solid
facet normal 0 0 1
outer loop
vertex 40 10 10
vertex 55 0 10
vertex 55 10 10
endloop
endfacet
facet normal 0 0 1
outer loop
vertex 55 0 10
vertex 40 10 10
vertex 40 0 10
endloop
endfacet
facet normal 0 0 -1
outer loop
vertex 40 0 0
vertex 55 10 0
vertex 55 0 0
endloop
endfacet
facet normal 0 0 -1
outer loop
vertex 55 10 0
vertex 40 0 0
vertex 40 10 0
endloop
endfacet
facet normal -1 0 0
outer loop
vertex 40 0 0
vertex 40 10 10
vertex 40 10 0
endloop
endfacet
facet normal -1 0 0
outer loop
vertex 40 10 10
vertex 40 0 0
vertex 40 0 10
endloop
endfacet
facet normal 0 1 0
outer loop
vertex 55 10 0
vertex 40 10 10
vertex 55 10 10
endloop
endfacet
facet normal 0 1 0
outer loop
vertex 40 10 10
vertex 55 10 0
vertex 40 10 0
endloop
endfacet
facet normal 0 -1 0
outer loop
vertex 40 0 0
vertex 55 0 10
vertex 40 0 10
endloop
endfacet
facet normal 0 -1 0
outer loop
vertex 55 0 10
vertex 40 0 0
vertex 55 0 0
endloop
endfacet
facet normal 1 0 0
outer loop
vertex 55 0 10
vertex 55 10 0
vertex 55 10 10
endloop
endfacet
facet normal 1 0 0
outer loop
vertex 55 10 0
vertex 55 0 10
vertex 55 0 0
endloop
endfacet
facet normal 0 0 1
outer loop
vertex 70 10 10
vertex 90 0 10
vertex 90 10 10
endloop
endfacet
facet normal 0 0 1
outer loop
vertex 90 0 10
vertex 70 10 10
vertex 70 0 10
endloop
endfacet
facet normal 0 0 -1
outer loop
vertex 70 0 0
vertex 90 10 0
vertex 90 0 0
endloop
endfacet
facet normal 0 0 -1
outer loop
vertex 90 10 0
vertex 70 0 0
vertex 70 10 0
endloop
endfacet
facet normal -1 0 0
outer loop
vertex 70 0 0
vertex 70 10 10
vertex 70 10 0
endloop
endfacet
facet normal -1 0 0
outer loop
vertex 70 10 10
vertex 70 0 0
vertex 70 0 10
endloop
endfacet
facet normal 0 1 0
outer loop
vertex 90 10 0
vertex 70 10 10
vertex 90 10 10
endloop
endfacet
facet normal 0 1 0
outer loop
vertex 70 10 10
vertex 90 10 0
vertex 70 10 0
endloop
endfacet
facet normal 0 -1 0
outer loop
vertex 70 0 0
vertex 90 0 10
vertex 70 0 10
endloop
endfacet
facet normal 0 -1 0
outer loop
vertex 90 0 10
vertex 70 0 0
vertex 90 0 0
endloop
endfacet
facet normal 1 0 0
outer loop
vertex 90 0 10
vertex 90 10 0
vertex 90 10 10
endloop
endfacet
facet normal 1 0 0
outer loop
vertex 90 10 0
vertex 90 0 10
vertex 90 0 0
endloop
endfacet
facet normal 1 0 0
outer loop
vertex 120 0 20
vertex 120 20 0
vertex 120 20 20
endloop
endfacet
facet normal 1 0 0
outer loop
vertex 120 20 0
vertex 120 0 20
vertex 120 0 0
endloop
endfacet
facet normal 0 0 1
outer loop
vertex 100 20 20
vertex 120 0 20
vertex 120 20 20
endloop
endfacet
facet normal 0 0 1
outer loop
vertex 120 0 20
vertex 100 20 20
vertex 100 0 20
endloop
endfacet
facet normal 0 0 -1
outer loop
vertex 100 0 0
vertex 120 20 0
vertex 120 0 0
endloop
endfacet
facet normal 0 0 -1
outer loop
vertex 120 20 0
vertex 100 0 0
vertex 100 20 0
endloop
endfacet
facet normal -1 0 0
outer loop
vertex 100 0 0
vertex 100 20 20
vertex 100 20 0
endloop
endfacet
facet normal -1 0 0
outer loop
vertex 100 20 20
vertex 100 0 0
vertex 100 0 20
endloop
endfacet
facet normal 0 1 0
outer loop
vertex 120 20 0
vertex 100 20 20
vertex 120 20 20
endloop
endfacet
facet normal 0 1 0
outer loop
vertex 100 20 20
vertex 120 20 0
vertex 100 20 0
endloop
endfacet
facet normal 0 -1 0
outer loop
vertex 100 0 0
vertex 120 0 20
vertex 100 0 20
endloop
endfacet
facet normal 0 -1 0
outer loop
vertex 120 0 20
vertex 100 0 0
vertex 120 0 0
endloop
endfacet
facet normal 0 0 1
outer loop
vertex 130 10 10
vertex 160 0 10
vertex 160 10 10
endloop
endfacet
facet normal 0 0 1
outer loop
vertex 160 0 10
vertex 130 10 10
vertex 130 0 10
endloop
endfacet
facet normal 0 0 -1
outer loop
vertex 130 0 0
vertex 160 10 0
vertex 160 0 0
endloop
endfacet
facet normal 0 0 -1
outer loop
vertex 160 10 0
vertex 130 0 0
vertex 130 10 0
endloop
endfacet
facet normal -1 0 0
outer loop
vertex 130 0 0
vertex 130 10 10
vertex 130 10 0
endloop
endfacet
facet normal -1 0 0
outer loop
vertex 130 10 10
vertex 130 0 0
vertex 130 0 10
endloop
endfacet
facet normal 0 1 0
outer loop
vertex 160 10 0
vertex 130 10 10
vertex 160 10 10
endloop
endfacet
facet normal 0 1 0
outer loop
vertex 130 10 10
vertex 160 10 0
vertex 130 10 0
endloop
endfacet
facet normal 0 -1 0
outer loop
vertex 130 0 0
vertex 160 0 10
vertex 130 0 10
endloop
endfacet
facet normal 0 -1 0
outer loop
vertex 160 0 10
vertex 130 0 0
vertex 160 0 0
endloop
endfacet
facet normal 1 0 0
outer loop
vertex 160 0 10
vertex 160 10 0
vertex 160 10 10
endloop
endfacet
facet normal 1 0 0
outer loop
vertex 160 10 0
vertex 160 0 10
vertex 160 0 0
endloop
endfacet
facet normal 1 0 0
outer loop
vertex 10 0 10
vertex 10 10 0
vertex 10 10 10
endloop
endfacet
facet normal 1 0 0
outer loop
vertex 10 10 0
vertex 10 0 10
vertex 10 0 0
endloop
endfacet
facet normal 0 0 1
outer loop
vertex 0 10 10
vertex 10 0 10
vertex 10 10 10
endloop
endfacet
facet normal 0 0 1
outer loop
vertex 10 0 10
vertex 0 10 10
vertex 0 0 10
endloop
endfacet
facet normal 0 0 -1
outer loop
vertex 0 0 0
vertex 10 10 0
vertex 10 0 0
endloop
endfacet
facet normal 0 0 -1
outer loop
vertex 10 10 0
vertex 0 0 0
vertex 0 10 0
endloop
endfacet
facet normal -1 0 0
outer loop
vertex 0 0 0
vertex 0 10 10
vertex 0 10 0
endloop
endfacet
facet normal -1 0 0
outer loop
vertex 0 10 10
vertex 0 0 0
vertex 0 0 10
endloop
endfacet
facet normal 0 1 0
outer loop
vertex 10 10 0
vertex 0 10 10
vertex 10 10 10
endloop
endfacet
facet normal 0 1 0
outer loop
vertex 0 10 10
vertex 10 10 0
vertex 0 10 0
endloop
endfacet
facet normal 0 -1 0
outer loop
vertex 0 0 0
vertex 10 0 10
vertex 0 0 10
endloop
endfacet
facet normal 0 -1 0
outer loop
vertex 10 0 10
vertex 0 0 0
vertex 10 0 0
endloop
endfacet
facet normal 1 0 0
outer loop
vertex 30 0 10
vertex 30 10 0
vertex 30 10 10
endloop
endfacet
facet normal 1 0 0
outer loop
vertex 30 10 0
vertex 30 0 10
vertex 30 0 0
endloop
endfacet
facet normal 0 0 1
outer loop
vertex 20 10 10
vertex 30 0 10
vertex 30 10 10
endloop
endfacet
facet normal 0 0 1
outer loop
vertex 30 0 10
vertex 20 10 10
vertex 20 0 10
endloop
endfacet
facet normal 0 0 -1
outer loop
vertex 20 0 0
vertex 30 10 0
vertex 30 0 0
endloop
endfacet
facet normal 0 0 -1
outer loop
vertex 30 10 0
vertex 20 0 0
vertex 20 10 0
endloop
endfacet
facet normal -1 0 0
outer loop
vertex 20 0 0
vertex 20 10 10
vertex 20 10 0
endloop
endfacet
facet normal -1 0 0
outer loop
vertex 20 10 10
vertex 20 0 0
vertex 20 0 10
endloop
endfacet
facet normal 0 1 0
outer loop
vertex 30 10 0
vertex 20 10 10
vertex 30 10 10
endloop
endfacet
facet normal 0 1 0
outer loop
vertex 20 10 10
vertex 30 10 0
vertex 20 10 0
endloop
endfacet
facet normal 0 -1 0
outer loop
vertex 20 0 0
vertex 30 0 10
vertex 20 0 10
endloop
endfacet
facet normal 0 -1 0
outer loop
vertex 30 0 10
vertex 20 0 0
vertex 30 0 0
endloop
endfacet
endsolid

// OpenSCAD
// Simple union tests for debugging
// Each test case is clearly separated

// Test 1: Two non-overlapping cubes
translate([0, 0, 0]) cube([10, 10, 10]);
translate([20, 0, 0]) cube([10, 10, 10]);

// Test 2: Two overlapping cubes (should merge)
translate([40, 0, 0]) union() {
    cube([10, 10, 10]);
    translate([5, 0, 0]) cube([10, 10, 10]);
}

// Test 3: Two touching cubes (edge to edge)
translate([70, 0, 0]) union() {
    cube([10, 10, 10]);
    translate([10, 0, 0]) cube([10, 10, 10]);
}

// Test 4: One cube inside another (should result in outer cube only)
translate([100, 0, 0]) union() {
    cube([20, 20, 20]);
    translate([5, 5, 5]) cube([10, 10, 10]);
}

// Test 5: Three cubes in a row
translate([130, 0, 0]) union() {
    cube([10, 10, 10]);
    translate([10, 0, 0]) cube([10, 10, 10]);
    translate([20, 0, 0]) cube([10, 10, 10]);
}
